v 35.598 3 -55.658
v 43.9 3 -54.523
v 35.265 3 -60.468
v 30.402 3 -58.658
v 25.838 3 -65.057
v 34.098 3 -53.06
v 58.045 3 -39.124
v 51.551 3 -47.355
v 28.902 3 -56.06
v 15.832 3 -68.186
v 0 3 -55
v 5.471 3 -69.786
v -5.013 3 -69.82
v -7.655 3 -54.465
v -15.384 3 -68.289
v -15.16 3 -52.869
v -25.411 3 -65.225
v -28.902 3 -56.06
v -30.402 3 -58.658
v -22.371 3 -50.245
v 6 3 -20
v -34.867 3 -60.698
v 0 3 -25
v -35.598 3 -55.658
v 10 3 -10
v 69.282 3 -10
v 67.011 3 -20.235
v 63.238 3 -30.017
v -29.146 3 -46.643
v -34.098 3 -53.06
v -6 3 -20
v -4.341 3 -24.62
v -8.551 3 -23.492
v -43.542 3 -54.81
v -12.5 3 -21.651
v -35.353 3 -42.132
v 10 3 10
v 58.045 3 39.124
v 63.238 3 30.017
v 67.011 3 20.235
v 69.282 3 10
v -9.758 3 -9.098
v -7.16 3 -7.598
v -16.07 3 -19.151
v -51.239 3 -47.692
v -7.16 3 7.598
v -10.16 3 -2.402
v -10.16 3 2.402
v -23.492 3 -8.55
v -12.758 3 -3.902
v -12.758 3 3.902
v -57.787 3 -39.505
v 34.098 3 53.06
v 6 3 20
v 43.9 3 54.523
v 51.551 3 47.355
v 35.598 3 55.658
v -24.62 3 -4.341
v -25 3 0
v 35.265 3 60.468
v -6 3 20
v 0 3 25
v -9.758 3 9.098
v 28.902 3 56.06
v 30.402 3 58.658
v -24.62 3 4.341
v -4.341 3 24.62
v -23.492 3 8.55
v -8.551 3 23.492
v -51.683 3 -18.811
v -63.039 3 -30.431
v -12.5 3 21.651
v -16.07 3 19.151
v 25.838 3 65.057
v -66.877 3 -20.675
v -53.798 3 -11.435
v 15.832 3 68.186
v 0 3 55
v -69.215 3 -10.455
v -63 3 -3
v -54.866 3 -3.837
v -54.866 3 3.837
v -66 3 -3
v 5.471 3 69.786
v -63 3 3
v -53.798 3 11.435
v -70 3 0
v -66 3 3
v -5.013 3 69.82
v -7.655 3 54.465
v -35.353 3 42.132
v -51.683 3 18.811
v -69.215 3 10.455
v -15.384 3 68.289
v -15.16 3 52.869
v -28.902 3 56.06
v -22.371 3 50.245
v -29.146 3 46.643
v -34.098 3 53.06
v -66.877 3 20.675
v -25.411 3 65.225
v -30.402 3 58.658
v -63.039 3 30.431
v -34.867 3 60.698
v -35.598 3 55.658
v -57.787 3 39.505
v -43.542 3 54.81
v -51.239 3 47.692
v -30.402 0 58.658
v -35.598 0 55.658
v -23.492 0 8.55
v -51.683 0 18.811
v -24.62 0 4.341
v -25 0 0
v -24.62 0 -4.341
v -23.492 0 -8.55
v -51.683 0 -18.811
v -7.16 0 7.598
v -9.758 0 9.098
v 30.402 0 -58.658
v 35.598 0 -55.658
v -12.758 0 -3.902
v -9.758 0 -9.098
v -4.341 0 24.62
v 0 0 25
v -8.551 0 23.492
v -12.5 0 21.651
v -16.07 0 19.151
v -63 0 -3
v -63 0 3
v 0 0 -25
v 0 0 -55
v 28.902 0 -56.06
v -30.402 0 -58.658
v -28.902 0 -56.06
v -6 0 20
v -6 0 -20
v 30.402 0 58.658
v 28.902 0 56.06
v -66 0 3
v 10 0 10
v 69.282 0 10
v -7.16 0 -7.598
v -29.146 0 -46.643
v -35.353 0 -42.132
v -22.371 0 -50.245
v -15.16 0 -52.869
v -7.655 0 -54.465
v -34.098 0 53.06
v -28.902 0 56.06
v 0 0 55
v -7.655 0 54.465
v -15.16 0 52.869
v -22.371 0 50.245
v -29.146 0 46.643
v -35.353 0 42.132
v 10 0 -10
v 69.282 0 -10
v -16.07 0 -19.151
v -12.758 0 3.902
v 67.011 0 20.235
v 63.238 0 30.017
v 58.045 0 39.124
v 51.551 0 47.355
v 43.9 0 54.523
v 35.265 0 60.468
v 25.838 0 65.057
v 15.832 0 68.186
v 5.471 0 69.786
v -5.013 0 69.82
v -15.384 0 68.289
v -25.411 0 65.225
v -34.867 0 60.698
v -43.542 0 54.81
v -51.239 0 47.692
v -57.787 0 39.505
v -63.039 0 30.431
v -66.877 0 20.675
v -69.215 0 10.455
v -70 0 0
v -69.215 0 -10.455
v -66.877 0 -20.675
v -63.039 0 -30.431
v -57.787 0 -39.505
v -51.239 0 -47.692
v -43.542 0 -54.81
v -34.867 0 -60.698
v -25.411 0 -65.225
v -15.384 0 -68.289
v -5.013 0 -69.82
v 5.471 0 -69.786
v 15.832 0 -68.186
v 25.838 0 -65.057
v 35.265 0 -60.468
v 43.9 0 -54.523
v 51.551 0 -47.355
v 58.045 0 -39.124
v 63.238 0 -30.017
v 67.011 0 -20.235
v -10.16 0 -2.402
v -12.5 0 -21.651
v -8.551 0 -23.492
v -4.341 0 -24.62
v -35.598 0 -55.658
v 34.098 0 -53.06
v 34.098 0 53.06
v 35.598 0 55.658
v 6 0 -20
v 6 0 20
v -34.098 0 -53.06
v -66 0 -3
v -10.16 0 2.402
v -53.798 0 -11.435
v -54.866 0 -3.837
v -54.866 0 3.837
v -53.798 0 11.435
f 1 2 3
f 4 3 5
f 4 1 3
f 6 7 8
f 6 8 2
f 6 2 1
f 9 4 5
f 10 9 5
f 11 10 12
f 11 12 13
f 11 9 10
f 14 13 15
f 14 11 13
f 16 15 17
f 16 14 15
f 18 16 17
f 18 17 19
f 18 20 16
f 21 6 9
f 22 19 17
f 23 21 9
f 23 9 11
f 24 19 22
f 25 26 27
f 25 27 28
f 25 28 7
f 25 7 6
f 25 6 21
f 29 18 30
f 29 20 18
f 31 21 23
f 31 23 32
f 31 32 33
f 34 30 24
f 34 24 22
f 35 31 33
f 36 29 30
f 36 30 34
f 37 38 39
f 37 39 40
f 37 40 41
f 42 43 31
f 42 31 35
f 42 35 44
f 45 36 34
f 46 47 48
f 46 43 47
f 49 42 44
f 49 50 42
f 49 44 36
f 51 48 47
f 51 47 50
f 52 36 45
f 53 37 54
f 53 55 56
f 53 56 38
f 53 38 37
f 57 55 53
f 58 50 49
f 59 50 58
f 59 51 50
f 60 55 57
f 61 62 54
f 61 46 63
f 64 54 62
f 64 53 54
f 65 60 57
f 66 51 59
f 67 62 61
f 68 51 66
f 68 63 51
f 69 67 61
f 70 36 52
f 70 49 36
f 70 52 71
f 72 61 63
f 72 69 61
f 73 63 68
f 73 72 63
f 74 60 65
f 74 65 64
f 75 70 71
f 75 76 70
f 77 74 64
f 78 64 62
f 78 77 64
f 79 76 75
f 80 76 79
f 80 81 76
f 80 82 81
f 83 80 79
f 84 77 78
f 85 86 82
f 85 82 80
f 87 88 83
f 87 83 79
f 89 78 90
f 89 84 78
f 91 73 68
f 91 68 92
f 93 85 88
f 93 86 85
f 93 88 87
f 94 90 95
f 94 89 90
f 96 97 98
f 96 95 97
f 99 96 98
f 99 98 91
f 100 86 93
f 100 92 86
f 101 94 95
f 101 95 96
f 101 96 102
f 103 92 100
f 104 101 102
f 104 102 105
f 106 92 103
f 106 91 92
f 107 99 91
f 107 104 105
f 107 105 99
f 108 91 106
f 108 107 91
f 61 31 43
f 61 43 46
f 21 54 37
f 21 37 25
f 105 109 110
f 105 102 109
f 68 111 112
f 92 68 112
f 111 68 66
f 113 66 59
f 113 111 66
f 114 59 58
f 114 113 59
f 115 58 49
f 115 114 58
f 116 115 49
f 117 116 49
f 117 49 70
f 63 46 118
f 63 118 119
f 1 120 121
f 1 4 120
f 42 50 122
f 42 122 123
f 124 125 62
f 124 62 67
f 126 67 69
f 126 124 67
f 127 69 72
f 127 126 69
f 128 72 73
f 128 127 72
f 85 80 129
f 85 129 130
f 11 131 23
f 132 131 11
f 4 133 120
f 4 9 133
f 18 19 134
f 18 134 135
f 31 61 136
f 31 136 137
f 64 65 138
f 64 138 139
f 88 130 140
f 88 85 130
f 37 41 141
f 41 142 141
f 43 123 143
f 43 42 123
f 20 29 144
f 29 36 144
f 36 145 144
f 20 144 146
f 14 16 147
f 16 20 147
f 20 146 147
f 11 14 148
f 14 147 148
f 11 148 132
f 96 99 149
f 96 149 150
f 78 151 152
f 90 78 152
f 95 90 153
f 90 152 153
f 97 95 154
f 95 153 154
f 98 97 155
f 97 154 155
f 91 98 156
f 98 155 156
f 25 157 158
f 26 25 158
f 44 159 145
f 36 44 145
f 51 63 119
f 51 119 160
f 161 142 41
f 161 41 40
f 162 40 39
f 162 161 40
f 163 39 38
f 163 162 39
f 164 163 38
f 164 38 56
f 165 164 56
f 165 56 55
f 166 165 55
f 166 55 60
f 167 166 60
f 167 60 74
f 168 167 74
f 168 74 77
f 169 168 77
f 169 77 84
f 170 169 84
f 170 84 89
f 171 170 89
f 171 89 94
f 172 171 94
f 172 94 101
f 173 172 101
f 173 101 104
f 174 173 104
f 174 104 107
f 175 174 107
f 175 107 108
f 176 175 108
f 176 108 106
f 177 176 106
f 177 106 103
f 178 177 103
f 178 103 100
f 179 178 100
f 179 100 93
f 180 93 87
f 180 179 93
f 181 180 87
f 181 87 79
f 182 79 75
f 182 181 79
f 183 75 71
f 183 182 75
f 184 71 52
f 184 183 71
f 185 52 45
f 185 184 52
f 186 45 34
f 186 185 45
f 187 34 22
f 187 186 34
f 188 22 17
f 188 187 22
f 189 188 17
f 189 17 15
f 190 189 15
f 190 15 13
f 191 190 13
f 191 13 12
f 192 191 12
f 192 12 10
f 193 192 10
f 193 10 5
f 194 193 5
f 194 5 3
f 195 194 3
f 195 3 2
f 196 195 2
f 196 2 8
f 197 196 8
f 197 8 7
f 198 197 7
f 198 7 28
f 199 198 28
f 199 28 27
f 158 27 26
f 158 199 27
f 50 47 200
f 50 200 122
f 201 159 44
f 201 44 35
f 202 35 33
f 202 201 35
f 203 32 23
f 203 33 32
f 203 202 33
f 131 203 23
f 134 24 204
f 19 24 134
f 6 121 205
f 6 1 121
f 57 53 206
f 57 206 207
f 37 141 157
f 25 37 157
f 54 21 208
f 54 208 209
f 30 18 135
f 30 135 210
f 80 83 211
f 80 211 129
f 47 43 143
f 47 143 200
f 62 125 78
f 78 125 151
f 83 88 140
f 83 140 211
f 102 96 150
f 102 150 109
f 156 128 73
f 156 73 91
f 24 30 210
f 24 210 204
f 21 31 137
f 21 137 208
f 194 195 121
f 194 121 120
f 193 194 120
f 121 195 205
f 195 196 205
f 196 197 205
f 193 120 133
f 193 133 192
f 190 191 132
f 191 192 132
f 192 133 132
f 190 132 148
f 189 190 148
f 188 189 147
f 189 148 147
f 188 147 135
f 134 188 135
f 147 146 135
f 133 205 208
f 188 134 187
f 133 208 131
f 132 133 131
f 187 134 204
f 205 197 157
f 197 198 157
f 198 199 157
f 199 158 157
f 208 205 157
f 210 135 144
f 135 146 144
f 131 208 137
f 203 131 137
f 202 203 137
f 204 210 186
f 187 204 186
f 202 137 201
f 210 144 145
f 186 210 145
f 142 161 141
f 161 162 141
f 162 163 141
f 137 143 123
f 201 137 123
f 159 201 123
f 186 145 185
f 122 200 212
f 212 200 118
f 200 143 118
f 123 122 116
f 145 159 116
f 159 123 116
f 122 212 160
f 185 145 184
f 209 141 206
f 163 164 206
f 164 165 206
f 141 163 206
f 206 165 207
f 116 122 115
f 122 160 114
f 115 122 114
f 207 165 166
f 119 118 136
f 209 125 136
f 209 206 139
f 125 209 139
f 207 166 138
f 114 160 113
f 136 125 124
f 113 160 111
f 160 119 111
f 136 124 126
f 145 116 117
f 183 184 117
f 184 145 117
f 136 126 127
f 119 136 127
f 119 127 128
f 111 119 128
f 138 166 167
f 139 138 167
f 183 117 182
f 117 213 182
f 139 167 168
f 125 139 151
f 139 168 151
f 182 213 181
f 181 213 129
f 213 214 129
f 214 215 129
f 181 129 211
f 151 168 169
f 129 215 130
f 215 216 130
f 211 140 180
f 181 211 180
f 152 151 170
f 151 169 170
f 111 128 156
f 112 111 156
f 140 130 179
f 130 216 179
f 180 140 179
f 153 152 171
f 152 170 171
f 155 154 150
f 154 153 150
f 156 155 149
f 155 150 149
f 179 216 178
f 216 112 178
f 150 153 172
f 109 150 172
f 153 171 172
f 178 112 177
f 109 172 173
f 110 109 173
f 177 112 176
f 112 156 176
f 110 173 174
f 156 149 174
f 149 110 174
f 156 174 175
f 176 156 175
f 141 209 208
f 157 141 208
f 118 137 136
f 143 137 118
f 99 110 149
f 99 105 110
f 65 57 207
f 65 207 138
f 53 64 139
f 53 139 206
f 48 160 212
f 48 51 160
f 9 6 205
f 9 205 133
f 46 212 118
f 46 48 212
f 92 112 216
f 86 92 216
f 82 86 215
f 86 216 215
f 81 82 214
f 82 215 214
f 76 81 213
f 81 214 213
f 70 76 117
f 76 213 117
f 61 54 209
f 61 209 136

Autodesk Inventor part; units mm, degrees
ref_plane "YZ Plane" through (0, 0, 0) normal (1, 0, 0) x (0, 1, 0)
ref_plane "XZ Plane" through (0, 0, 0) normal (0, 1, 0) x (-1, 0, 0)
ref_plane "XY Plane" through (0, 0, 0) normal (0, 0, 1) x (1, 0, 0)
sketch "草圖1" plane through (0, 0, 0) normal (0, 1, 0) x (-1, 0, 0)
  circle A0 centre (0, 0) radius 70
  circle A1 centre (0, 0) radius 25
  line L0 (-70, 10) -> (-10, 10)
  line L1 (-10, 10) -> (-10, -10)
  line L2 (-10, -10) -> (-70, -10)
  line L3 (-70, -10) -> (-70, 10)
  line L4 (0, 0) -> (0, -55)
  line L5 (0, 0) -> (35.3533, -42.1324)
  arc A2 (0, -55) -> (35.3533, -42.1324) centre (0, 0) ccw
  line L6 (0, 0) -> (51.6831, -18.8111)
  line L7 (0, 0) -> (51.6831, 18.8111)
  arc A3 (51.6831, -18.8111) -> (51.6831, 18.8111) centre (0, 0) ccw
  line L8 (0, 0) -> (35.3533, 42.1324)
  line L9 (0, 0) -> (0, 55)
  arc A4 (35.3533, 42.1324) -> (0, 55) centre (0, 0) ccw
  line L10 (-9.3, -13.3795) -> (-36.7, -13.3795)
  line L11 (-36.7, -13.3795) -> (-36.7, -69.3795)
  line L12 (-36.7, -69.3795) -> (-9.3, -69.3795)
  line L13 (-9.3, -69.3795) -> (-9.3, -13.3795)
  line L14 (-7.8, -20.3795) -> (-10.8, -20.3795)
  line L15 (-10.8, -20.3795) -> (-10.8, -27.3795)
  line L16 (-10.8, -27.3795) -> (-7.8, -27.3795)
  line L17 (-7.8, -27.3795) -> (-7.8, -20.3795)
  line L18 (-7.8, -55.3795) -> (-10.8, -55.3795)
  line L19 (-10.8, -55.3795) -> (-10.8, -62.3795)
  line L20 (-10.8, -62.3795) -> (-7.8, -62.3795)
  line L21 (-7.8, -62.3795) -> (-7.8, -55.3795)
  line L22 (-35.2, -20.3795) -> (-38.2, -20.3795)
  line L23 (-38.2, -20.3795) -> (-38.2, -27.3795)
  line L24 (-38.2, -27.3795) -> (-35.2, -27.3795)
  line L25 (-35.2, -27.3795) -> (-35.2, -20.3795)
  line L26 (-35.2, -48.3795) -> (-38.2, -48.3795)
  line L27 (-38.2, -48.3795) -> (-38.2, -55.3795)
  line L28 (-38.2, -55.3795) -> (-35.2, -55.3795)
  line L29 (-35.2, -55.3795) -> (-35.2, -48.3795)
  circle A5 centre (0, 0) radius 2
  line L30 (-1.5, 1.3229) -> (-1.5, -1.3229)
  point P0 (-23, -13.3795)
  point P1 (-9.3, -20.3795)
  point P2 (-9.3, -62.3795)
  point P3 (-36.7, -20.3795)
  point P4 (-36.7, -48.3795)
  point P5 (16.0697, -19.1511)
  point P6 (0, -25)
  point P7 (-69.282, 10)
  point P8 (-69.282, -10)
  point P9 (16.0697, 19.1511)
  point P10 (0, 25)
  point P11 (23.4923, -8.5505)
  point P12 (23.4923, 8.5505)
  point P13 (-70, 0)
  dimension "d0" = 140
  dimension "d1" = 50
  dimension "d2" = 20
  dimension "d3" = 60
  dimension "d4" = 55
  dimension "d5" = 40
  dimension "d6" = 55
  dimension "d9" = 140
  dimension "d11" = 13
  dimension "d12" = 27.4
  dimension "d13" = 56
  dimension "d14" = 7
  dimension "d15" = 3
  dimension "d16" = 7
  dimension "d17" = 7
  dimension "d18" = 3
  dimension "d19" = 7
  dimension "d20" = 7
  dimension "d21" = 3
  dimension "d22" = 7
  dimension "d23" = 7
  dimension "d24" = 3
  dimension "d25" = 21
  dimension "d28" = 4
  dimension "d29" = 1.5
extrude "擠出1" add sketch "草圖1" along normal blind 3 contours L13 L20 L21 L18 L16 L17 A1 L4 A2 L5 L6 A3 L7 L8 A4 L9 L0 A0 | A0 L11 L28 L29 L26 L24 L25 L22 L10 A1 L15 L16 L13 L18 L19 L20 | A0 L2 A1 L10 L11 L22 L23 L24 L26 L27 L28 | L20 L19 L18 L13 | L13 L18 L21 L20 | L28 L27 L26 L11 | L11 L26 L29 L28 | A1 L9 A5 L4 L17 L14 L13 L10 L2 L1 L0 | L16 L15 A1 L13 | L13 A1 L17 L16 | A1 L8 A5 L9 | L10 L13 L14 L15 A1 | L24 L23 L22 L11 | L11 L22 L25 L24 | L13 L14 L17 A1 | A1 L15 L14 L13 | A1 L7 A5 L8 | A1 L6 A5 L7 | L30 A5 | L4 A5 L5 A1 | A5 L6 A1 L5
sketch "草圖2" plane through (0, 3, 0) normal (0, 1, 0) x (1, 0, 0)
  line L0 (-3, 13) -> (3, 13)
  line L1 (3, 13) -> (3, 10)
  line L2 (3, 10) -> (-3, 10)
  line L3 (-3, 10) -> (-3, 13)
  line L4 (-12.7583, 3.9019) -> (-9.7583, 9.0981)
  line L5 (-9.7583, 9.0981) -> (-7.1603, 7.5981)
  line L6 (-7.1603, 7.5981) -> (-10.1603, 2.4019)
  line L7 (-10.1603, 2.4019) -> (-12.7583, 3.9019)
  line L8 (-9.7583, -9.0981) -> (-12.7583, -3.9019)
  line L9 (-12.7583, -3.9019) -> (-10.1603, -2.4019)
  line L10 (-10.1603, -2.4019) -> (-7.1603, -7.5981)
  line L11 (-7.1603, -7.5981) -> (-9.7583, -9.0981)
  line L12 (3, -13) -> (-3, -13)
  line L13 (-3, -13) -> (-3, -10)
  line L14 (-3, -10) -> (3, -10)
  line L15 (3, -10) -> (3, -13)
  line L16 (-66, 3) -> (-63, 3)
  line L17 (-63, 3) -> (-63, -3)
  line L18 (-63, -3) -> (-66, -3)
  line L19 (-66, -3) -> (-66, 3)
  line L20 (-34.0981, -53.0596) -> (-28.9019, -56.0596)
  line L21 (-28.9019, -56.0596) -> (-30.4019, -58.6577)
  line L22 (-30.4019, -58.6577) -> (-35.5981, -55.6577)
  line L23 (-35.5981, -55.6577) -> (-34.0981, -53.0596)
  line L24 (28.9019, -56.0596) -> (34.0981, -53.0596)
  line L25 (34.0981, -53.0596) -> (35.5981, -55.6577)
  line L26 (35.5981, -55.6577) -> (30.4019, -58.6577)
  line L27 (30.4019, -58.6577) -> (28.9019, -56.0596)
  line L28 (63, -3) -> (63, 3)
  line L29 (63, 3) -> (66, 3)
  line L30 (66, 3) -> (66, -3)
  line L31 (66, -3) -> (63, -3)
  line L32 (34.0981, 53.0596) -> (28.9019, 56.0596)
  line L33 (28.9019, 56.0596) -> (30.4019, 58.6577)
  line L34 (30.4019, 58.6577) -> (35.5981, 55.6577)
  line L35 (35.5981, 55.6577) -> (34.0981, 53.0596)
  line L36 (-28.9019, 56.0596) -> (-34.0981, 53.0596)
  line L37 (-34.0981, 53.0596) -> (-35.5981, 55.6577)
  line L38 (-35.5981, 55.6577) -> (-30.4019, 58.6577)
  line L39 (-30.4019, 58.6577) -> (-28.9019, 56.0596)
  point P0 (0, 0)
  point P1 (0, 10)
  point P2 (-8.6603, 5)
  point P3 (-8.6603, -5)
  point P4 (0, -10)
  point P5 (-63, 0)
  point P6 (-31.5, -54.5596)
  point P7 (31.5, -54.5596)
  point P8 (63, 0)
  point P9 (31.5, 54.5596)
  point P10 (-31.5, 54.5596)
  dimension "d30" = 3
  dimension "d31" = 6
  dimension "d32" = 10
  dimension "d35" = 180
  dimension "d46" = 3
  dimension "d47" = 6
  dimension "d48" = 63
  dimension "d51" = 360
extrude "擠出2" cut sketch "草圖2" against normal through all contours L0 L1 L2 L3 | L4 L5 L6 L7 | L8 L9 L10 L11 | L12 L13 L14 L15 | L16 L17 L18 L19 | L20 L21 L22 L23 | L24 L25 L26 L27 | L32 L33 L34 L35 | L36 L37 L38 L39
sketch "草圖3" plane through (0, 3, 0) normal (0, 1, 0) x (1, 0, 0)
  circle A0 centre (0, 0) radius 6
  line L0 (-6, 20) -> (6, 20)
  line L1 (6, 20) -> (6, -20)
  line L2 (6, -20) -> (-6, -20)
  line L3 (-6, -20) -> (-6, 20)
  point P0 (6, 0)
  point P1 (0, 20)
  dimension "d53" = 12
  dimension "d54" = 40
  dimension "d55" = 12
extrude "擠出3" cut sketch "草圖3" against normal blind 10
properties material "MDF Medium Density Fiberboard"
